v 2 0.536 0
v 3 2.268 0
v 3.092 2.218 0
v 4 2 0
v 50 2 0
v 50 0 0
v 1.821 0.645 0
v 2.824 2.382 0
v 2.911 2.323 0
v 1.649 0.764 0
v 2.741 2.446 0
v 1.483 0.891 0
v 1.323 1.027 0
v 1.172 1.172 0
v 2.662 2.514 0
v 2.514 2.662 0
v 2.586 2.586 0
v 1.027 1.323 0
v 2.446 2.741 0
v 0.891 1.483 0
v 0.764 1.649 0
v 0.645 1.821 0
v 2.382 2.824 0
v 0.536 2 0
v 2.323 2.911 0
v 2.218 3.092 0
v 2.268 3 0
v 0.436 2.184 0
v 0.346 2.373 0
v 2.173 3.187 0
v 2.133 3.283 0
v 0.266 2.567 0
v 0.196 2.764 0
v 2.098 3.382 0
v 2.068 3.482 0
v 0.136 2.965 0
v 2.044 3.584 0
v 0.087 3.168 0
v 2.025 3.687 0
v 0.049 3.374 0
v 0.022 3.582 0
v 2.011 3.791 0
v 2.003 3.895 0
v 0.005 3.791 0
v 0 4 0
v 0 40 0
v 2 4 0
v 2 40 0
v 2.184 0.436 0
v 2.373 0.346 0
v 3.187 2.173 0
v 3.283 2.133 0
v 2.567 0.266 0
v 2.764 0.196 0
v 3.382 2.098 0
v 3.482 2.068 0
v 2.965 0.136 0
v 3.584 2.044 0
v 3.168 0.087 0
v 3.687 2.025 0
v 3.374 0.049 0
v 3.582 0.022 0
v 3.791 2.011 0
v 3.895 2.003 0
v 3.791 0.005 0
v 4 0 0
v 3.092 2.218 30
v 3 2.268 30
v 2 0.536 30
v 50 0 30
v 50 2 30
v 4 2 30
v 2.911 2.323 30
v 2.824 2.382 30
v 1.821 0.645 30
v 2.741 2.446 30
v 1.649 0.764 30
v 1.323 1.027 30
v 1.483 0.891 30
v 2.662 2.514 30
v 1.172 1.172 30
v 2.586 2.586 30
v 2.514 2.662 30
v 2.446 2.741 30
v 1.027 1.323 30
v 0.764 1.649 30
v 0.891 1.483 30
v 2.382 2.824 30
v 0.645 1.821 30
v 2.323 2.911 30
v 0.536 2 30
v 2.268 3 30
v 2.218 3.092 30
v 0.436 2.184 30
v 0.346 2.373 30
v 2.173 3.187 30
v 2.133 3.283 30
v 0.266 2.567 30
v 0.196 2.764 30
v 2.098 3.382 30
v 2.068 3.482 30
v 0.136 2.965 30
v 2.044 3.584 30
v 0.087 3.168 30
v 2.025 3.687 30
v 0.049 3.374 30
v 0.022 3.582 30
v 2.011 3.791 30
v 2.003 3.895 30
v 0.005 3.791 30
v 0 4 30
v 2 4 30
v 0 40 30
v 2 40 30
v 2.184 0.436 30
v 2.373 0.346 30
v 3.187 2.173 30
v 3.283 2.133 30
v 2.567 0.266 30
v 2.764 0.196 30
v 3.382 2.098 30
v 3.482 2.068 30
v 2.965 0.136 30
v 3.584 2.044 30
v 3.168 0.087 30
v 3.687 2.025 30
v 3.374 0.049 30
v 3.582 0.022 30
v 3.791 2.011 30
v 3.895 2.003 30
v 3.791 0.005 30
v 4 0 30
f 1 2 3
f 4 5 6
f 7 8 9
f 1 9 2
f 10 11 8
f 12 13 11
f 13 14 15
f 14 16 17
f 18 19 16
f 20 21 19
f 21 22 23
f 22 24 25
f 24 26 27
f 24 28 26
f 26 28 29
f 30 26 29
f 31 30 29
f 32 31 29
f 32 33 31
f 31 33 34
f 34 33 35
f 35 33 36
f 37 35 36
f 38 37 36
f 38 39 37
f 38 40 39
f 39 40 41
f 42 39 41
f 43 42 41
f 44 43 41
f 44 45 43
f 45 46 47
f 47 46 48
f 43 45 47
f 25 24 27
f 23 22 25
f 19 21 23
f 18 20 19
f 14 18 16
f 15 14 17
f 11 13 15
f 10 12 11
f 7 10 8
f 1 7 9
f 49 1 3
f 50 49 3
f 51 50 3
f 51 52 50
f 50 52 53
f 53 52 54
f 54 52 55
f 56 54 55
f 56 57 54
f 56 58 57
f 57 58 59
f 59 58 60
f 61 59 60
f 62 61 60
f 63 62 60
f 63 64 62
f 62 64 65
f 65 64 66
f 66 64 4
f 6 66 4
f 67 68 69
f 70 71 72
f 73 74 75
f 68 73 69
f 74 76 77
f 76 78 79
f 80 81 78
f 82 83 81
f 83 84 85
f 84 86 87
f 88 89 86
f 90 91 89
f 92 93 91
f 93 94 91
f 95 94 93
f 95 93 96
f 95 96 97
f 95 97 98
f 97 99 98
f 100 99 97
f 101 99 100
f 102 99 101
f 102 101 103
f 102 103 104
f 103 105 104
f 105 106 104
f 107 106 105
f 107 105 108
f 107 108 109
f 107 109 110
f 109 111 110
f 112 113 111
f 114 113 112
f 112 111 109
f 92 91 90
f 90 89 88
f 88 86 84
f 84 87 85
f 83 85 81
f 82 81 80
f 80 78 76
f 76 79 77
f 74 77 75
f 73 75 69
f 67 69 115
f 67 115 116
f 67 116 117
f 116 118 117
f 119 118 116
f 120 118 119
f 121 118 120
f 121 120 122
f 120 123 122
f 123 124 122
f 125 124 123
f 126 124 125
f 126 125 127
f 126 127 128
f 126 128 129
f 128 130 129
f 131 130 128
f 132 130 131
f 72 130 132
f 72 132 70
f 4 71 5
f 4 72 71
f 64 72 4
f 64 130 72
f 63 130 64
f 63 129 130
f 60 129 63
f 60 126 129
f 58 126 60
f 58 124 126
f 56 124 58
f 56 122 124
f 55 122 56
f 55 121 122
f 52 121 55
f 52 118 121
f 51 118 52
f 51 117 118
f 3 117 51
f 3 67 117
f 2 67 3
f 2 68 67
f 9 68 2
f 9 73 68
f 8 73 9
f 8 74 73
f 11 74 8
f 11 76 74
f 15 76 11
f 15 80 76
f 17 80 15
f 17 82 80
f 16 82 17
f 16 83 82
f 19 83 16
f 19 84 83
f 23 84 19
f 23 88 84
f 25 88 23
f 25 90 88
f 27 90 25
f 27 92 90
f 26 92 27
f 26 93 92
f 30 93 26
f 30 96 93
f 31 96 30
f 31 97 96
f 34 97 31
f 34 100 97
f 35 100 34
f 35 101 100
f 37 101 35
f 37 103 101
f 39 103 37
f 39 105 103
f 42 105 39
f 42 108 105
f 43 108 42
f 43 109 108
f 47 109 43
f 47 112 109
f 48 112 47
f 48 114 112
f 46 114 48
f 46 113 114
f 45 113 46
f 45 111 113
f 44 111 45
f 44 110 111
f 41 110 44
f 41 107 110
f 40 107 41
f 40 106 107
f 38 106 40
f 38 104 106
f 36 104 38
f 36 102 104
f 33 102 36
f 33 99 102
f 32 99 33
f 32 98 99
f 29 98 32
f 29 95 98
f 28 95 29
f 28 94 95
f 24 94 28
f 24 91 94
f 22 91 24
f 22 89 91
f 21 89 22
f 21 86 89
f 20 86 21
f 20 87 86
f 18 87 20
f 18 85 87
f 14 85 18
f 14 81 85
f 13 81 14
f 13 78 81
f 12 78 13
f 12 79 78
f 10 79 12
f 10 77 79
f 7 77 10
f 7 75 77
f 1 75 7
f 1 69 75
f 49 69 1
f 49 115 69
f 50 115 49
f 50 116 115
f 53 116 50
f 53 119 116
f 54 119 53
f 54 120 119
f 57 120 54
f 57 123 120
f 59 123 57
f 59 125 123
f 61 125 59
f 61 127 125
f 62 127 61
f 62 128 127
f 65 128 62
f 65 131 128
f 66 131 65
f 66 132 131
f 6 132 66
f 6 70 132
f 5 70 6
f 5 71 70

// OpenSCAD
// Units: mm
thickness_mm = 2.0;
bend_radius_mm = 2.0;
k_factor = 0.45;
bend_angle_deg = 90;

outside_length_a_mm = 50.0;
outside_length_b_mm = 40.0;
bracket_width_mm = 30.0;

bend_allowance_mm = PI / 2 * (bend_radius_mm + k_factor * thickness_mm);
outside_setback_mm = (bend_radius_mm + thickness_mm) * tan(bend_angle_deg / 2);
bend_deduction_mm = 2 * outside_setback_mm - bend_allowance_mm;
flat_length_mm = outside_length_a_mm + outside_length_b_mm - bend_deduction_mm;

echo(str(
    "MAKERBENCH-SHEETMETAL: {\"thickness_mm\": ",
    thickness_mm,
    ", \"bend_radius_mm\": ",
    bend_radius_mm,
    ", \"flat_length_mm\": ",
    flat_length_mm,
    "}"
));

$fn = 64;

module l_bracket_cross_section() {
    outer_r = bend_radius_mm + thickness_mm;
    inner_r = bend_radius_mm;
    cx = outer_r;
    cy = outer_r;

    outer_arc = [
        for (a = [270 : -3 : 180])
            [cx + outer_r * cos(a), cy + outer_r * sin(a)]
    ];

    inner_arc = [
        for (a = [180 : 3 : 270])
            [cx + inner_r * cos(a), cy + inner_r * sin(a)]
    ];

    polygon(concat(
        [[outside_length_a_mm, 0]],
        outer_arc,
        [[0, outside_length_b_mm],
         [thickness_mm, outside_length_b_mm]],
        inner_arc,
        [[outside_length_a_mm, thickness_mm]]
    ));
}

linear_extrude(height = bracket_width_mm, convexity = 10)
    l_bracket_cross_section();
